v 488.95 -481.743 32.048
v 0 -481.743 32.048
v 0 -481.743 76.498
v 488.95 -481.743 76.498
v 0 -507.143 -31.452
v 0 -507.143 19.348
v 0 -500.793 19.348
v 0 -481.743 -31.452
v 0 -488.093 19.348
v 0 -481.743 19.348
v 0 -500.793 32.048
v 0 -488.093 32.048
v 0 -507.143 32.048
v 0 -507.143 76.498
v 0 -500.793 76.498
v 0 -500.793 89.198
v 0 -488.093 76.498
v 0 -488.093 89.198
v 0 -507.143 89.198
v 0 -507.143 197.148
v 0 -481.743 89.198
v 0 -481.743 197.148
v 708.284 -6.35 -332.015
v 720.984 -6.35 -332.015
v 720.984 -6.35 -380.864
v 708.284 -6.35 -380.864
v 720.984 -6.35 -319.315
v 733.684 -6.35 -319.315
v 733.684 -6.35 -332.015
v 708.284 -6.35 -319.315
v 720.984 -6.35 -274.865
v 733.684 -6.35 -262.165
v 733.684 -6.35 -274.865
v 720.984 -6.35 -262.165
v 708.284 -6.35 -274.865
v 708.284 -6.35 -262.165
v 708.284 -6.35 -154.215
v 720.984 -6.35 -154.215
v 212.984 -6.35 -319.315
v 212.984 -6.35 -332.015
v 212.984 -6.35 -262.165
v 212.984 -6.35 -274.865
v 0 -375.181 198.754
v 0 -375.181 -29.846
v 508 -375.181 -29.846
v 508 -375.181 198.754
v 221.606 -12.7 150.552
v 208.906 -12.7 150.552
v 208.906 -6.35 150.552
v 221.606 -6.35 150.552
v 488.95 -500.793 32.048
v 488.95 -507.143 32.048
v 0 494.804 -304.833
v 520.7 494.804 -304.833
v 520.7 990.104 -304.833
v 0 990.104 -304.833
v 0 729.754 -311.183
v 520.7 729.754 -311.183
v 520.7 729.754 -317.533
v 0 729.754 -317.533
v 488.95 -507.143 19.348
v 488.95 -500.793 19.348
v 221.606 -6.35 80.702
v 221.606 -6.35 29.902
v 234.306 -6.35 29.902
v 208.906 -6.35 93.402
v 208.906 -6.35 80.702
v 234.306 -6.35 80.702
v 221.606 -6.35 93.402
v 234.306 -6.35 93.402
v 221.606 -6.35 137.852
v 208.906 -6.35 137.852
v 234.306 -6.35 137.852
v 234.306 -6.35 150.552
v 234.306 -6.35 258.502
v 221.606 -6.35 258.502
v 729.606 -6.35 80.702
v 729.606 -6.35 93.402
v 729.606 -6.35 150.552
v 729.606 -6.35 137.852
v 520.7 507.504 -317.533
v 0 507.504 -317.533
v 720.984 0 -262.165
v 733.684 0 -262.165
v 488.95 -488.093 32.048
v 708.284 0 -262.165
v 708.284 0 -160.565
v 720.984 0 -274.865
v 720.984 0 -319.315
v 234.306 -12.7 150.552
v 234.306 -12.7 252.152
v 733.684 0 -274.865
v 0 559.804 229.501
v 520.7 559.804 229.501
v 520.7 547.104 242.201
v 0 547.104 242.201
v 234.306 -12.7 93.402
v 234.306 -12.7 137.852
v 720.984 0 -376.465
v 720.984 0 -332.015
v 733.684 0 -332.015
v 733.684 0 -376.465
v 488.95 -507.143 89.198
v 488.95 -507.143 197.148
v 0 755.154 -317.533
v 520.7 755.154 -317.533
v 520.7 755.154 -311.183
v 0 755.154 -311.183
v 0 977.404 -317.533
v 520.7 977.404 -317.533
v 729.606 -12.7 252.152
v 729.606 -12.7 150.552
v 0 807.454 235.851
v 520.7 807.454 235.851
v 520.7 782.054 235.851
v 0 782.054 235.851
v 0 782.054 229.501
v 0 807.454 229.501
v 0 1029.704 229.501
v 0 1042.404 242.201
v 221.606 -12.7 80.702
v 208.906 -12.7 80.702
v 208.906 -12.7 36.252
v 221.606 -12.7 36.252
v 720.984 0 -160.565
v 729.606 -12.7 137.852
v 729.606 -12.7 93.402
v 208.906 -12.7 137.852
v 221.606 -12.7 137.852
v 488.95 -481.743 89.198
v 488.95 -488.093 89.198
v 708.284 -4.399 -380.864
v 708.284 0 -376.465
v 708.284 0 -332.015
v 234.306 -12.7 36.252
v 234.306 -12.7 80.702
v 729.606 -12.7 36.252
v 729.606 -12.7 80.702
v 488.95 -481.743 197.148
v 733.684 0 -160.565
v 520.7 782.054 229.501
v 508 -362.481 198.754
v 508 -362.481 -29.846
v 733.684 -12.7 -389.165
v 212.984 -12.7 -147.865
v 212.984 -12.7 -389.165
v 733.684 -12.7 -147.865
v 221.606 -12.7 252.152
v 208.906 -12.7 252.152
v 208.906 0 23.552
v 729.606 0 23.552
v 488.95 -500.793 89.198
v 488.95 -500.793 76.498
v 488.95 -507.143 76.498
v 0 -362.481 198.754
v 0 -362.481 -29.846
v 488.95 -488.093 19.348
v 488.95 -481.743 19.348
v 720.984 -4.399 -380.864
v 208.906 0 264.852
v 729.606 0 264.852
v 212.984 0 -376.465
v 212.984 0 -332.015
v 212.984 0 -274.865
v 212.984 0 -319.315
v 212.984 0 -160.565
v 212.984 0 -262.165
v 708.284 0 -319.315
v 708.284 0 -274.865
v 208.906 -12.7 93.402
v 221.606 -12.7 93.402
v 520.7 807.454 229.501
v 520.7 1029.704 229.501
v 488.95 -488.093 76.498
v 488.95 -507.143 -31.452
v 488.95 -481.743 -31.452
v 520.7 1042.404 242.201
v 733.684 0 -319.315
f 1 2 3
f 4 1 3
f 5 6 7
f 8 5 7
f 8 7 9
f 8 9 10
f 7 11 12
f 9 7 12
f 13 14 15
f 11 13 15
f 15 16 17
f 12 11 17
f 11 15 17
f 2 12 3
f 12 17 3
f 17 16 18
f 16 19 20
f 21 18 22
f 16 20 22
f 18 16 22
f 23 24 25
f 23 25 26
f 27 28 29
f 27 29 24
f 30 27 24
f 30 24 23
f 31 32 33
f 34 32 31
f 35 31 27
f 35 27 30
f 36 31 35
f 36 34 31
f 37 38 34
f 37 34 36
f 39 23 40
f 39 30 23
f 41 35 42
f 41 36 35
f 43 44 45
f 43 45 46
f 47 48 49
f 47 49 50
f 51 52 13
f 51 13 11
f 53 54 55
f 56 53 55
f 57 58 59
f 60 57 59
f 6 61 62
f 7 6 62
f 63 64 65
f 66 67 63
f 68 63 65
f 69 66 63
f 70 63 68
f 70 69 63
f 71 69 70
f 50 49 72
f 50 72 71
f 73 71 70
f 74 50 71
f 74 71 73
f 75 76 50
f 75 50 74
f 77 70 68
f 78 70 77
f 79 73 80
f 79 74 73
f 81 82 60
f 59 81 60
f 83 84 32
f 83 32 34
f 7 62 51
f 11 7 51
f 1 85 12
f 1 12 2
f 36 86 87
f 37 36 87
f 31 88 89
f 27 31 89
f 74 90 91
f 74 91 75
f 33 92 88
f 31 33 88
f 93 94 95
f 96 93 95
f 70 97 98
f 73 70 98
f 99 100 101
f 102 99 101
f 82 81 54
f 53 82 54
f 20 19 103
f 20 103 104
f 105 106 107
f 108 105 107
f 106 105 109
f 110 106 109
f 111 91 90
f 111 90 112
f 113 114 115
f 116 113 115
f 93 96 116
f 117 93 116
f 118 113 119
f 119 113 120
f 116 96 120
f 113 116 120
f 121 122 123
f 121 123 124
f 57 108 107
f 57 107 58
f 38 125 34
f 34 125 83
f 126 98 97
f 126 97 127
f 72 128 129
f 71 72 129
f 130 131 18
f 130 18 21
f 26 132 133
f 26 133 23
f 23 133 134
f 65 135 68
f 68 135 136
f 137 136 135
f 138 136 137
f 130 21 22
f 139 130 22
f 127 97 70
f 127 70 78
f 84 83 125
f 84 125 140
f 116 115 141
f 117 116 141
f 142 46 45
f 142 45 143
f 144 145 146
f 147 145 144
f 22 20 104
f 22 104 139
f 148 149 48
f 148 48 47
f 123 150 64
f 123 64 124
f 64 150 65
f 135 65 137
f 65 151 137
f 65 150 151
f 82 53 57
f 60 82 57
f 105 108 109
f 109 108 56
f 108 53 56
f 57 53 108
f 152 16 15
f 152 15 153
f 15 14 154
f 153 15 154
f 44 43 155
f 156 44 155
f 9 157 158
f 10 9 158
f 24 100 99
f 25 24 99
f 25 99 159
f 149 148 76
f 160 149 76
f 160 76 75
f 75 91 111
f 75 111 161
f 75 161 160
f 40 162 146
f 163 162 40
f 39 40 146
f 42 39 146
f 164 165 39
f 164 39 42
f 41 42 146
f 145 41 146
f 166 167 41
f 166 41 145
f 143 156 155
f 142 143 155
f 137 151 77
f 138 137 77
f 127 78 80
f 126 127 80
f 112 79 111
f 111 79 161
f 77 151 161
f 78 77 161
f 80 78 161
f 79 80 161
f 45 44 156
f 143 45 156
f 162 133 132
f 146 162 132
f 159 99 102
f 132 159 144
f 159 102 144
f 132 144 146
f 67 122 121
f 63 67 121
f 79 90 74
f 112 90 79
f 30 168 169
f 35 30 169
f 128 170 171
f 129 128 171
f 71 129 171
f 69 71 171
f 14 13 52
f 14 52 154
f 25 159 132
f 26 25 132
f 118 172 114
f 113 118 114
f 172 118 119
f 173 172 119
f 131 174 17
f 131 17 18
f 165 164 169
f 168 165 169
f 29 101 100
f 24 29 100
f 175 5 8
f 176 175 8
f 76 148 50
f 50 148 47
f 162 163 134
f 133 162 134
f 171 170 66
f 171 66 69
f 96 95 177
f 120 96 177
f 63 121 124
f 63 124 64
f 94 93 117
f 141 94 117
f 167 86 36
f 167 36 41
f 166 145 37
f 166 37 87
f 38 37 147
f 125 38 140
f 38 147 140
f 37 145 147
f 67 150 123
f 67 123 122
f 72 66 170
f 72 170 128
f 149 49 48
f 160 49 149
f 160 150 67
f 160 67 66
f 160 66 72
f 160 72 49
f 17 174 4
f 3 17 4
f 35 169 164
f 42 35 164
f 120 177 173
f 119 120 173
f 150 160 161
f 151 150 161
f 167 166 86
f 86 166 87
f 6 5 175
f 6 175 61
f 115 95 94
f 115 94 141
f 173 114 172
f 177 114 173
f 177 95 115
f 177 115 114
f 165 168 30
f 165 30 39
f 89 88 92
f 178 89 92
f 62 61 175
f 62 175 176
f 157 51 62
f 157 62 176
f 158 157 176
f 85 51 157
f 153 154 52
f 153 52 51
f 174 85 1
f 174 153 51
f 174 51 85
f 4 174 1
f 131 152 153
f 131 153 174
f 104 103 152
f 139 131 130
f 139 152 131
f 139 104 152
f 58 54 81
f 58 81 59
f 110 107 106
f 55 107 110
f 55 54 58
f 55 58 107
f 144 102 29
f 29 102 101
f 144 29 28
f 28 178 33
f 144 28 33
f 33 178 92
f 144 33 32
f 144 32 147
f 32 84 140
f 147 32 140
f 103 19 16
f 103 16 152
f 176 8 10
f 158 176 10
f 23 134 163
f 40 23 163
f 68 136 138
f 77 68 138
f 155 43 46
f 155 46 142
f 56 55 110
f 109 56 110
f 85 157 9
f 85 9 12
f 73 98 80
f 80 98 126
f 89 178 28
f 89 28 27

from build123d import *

# Parameters (mm, degrees)
F0_W      = 520.7
F0_H      = 241.3
F1_DEPTH  = 12.7
F3_DEPTH  = 520.701
F4_W      = 520.7
F4_H      = 12.6999966025
F5_DEPTH  = 6.35
F7_DEPTH  = 6.35
F8_W      = 520.7
F8_H      = 241.3
F9_DEPTH  = 12.7
F11_DEPTH = 524.7793882141
F12_W     = 520.7
F12_H     = 12.6999874115
F13_DEPTH = 6.35
F15_DEPTH = 6.35
F16_W     = 520.7
F16_H     = 12.7000109196
F17_DEPTH = 6.35
F18_W     = 529.9902928591
F18_H     = 12.7000011563
F19_DEPTH = 6.35
F20_W     = 25.4
F20_H     = 228.6
F21_DEPTH = 488.95
F22_W     = 488.95
F22_H     = 12.6999971449
F23_DEPTH = 6.35
F24_W     = 6.35
F24_H     = 12.6999971449
F25_DEPTH = 488.951
F26_W     = 6.35
F26_H     = 12.7
F27_DEPTH = 488.951
F28_W     = 495.3
F28_H     = 12.7
F29_DEPTH = 520.7
F31_DEPTH = 520.701
F33_DEPTH = 520.701
F34_W     = 495.3
F34_H     = 12.7
F35_DEPTH = 520.7
F37_DEPTH = 520.701
F39_DEPTH = 520.701
F40_W     = 12.7
F40_H     = 228.6
F41_DEPTH = 508


with BuildPart() as f1:
    # F0 (on Front) → F1 (new body)
    with BuildSketch(Plane.XZ):
        with Locations((469.2560246944, 144.2023208976)):
            Rectangle(F0_W, F0_H)
    extrude(amount=F1_DEPTH)

    # F2 (on face) → F3 (cut, through all)
    with BuildSketch(Plane.YZ.offset(729.6060246944)):
        Polygon((0, 23.5523208976), (-12.7, 36.2523208976), (-12.7, 23.5523208976), align=None)
        Polygon((-12.7, 264.8523208976), (-12.7, 252.1523208976), (0, 264.8523208976), align=None)
    extrude(amount=-F3_DEPTH, mode=Mode.SUBTRACT)

    # F4 (on face) → F5 (cut)
    with BuildSketch(Plane.XZ.offset(12.7)):
        with Locations((469.2560246944, 144.2023191988)):
            Rectangle(F4_W, F4_H)
    extrude(amount=-F5_DEPTH, mode=Mode.SUBTRACT)

    # F6 (on face) → F7 (cut)
    with BuildSketch(Plane.XZ.offset(12.7)):
        Polygon((221.6060246944, 270.978808403), (221.6060246944, 137.8523208976), (221.6060246944, 8.170215413), (234.3060246944, 8.170215413), (234.3060246944, 264.8905813694), align=None)
    extrude(amount=-F7_DEPTH, mode=Mode.SUBTRACT)

    # F18 (on face) → F19 (cut)
    with BuildSketch(Plane.XZ.offset(12.7)):
        with Locations((464.6108782649, 87.0523203194)):
            Rectangle(F18_W, F18_H)
    extrude(amount=-F19_DEPTH, mode=Mode.SUBTRACT)


with BuildPart() as f9:
    # F8 (on Front) → F9 (new body)
    with BuildSketch(Plane.XZ):
        with Locations((473.3344129086, -268.51490798)):
            Rectangle(F8_W, F8_H)
    extrude(amount=F9_DEPTH)

    # F10 (on face) → F11 (cut, through all)
    with BuildSketch(Plane.YZ.offset(733.6844129086)):
        Polygon((-12.7, -147.86490798), (0, -160.56490798), (0, -147.86490798), align=None)
        Polygon((0, -389.16490798), (0, -376.46490798), (-12.7, -389.16490798), align=None)
    extrude(amount=-F11_DEPTH, mode=Mode.SUBTRACT)

    # F12 (on face) → F13 (cut)
    with BuildSketch(Plane(origin=(0, 0, 0), x_dir=(-1, 0, 0), z_dir=(0, 1, 0))):
        with Locations((-473.3344129086, -268.5149142742)):
            Rectangle(F12_W, F12_H)
    extrude(amount=-F13_DEPTH, mode=Mode.SUBTRACT)

    # F14 (on face) → F15 (cut)
    with BuildSketch(Plane(origin=(0, 0, 0), x_dir=(-1, 0, 0), z_dir=(0, 1, 0))):
        Polygon((-720.9844129086, -249.4649205685), (-720.9844129086, -262.1649205685), (-720.9844129086, -380.863904953), (-708.2844129086, -380.863904953), (-708.2844129086, -127.3064613342), (-720.9844129086, -127.3064613342), align=None)
    extrude(amount=-F15_DEPTH, mode=Mode.SUBTRACT)

    # F16 (on face) → F17 (cut)
    with BuildSketch(Plane(origin=(0, 0, 0), x_dir=(-1, 0, 0), z_dir=(0, 1, 0))):
        with Locations((-473.3344129086, -325.6649025202)):
            Rectangle(F16_W, F16_H)
    extrude(amount=-F17_DEPTH, mode=Mode.SUBTRACT)


with BuildPart() as f21:
    # F20 (on Right) → F21 (new body)
    with BuildSketch(Plane.YZ):
        with Locations((-494.4428418159, 82.8483165085)):
            Rectangle(F20_W, F20_H)
    extrude(amount=F21_DEPTH)

    # F22 (on face) → F23 (cut)
    with BuildSketch(Plane.XZ.offset(507.1428418159)):
        with Locations((244.475, 82.848315081)):
            Rectangle(F22_W, F22_H)
    extrude(amount=-F23_DEPTH, mode=Mode.SUBTRACT)

    # F24 (on face) → F25 (cut, through all)
    with BuildSketch(Plane.YZ.offset(488.95)):
        with Locations((-484.9178418159, 82.848315081)):
            Rectangle(F24_W, F24_H)
    extrude(amount=-F25_DEPTH, mode=Mode.SUBTRACT)

    # F26 (on face) → F27 (cut, through all)
    with BuildSketch(Plane.YZ.offset(488.95)):
        with Locations((-503.9678418159, 25.6983165085)):
            Rectangle(F26_W, F26_H)
        with Locations((-484.9178418159, 25.6983165085)):
            Rectangle(F26_W, F26_H)
    extrude(amount=-F27_DEPTH, mode=Mode.SUBTRACT)


with BuildPart() as f29:
    # F28 (on Right) → F29 (new body)
    with BuildSketch(Plane.YZ):
        with Locations((794.7544778824, 235.8510153532)):
            Rectangle(F28_W, F28_H)
    extrude(amount=F29_DEPTH)

    # F30 (on face) → F31 (cut, through all)
    with BuildSketch(Plane.YZ.offset(520.7)):
        Polygon((559.8044778824, 229.5010153532), (547.1044778824, 242.2010153532), (547.1044778824, 229.5010153532), align=None)
        Polygon((1042.4044778824, 242.2010153532), (1029.7044778824, 229.5010153532), (1042.4044778824, 229.5010153532), align=None)
    extrude(amount=-F31_DEPTH, mode=Mode.SUBTRACT)

    # F32 (on face) → F33 (cut, through all)
    with BuildSketch(Plane.YZ.offset(520.7)):
        Polygon((782.0544778824, 229.5010153532), (794.7544778824, 229.5010153532), (807.4544778824, 229.5010153532), (807.4544778824, 235.8510153532), (782.0544778824, 235.8510153532), align=None)
    extrude(amount=-F33_DEPTH, mode=Mode.SUBTRACT)


with BuildPart() as f35:
    # F34 (on Right) → F35 (new body)
    with BuildSketch(Plane.YZ):
        with Locations((742.4543227196, -311.1834632397)):
            Rectangle(F34_W, F34_H)
    extrude(amount=F35_DEPTH)

    # F36 (on face) → F37 (cut, through all)
    with BuildSketch(Plane.YZ.offset(520.7)):
        Polygon((494.8043227196, -304.8334632397), (494.8043227196, -317.5334632397), (507.5043227196, -317.5334632397), align=None)
        Polygon((990.1043227196, -304.8334632397), (977.4043227196, -317.5334632397), (990.1043227196, -317.5334632397), align=None)
    extrude(amount=-F37_DEPTH, mode=Mode.SUBTRACT)

    # F38 (on face) → F39 (cut, through all)
    with BuildSketch(Plane.YZ.offset(520.7)):
        Polygon((729.7543227196, -317.5334632397), (742.4543227196, -317.5334632397), (755.1543227196, -317.5334632397), (755.1543227196, -311.1834632397), (729.7543227196, -311.1834632397), align=None)
    extrude(amount=-F39_DEPTH, mode=Mode.SUBTRACT)


with BuildPart() as f41:
    # F40 (on Right) → F41 (new body)
    with BuildSketch(Plane.YZ):
        with Locations((-368.8312279224, 84.4538868248)):
            Rectangle(F40_W, F40_H)
    extrude(amount=F41_DEPTH)


solid = Compound([f1.part, f9.part, f21.part, f29.part, f35.part, f41.part])
